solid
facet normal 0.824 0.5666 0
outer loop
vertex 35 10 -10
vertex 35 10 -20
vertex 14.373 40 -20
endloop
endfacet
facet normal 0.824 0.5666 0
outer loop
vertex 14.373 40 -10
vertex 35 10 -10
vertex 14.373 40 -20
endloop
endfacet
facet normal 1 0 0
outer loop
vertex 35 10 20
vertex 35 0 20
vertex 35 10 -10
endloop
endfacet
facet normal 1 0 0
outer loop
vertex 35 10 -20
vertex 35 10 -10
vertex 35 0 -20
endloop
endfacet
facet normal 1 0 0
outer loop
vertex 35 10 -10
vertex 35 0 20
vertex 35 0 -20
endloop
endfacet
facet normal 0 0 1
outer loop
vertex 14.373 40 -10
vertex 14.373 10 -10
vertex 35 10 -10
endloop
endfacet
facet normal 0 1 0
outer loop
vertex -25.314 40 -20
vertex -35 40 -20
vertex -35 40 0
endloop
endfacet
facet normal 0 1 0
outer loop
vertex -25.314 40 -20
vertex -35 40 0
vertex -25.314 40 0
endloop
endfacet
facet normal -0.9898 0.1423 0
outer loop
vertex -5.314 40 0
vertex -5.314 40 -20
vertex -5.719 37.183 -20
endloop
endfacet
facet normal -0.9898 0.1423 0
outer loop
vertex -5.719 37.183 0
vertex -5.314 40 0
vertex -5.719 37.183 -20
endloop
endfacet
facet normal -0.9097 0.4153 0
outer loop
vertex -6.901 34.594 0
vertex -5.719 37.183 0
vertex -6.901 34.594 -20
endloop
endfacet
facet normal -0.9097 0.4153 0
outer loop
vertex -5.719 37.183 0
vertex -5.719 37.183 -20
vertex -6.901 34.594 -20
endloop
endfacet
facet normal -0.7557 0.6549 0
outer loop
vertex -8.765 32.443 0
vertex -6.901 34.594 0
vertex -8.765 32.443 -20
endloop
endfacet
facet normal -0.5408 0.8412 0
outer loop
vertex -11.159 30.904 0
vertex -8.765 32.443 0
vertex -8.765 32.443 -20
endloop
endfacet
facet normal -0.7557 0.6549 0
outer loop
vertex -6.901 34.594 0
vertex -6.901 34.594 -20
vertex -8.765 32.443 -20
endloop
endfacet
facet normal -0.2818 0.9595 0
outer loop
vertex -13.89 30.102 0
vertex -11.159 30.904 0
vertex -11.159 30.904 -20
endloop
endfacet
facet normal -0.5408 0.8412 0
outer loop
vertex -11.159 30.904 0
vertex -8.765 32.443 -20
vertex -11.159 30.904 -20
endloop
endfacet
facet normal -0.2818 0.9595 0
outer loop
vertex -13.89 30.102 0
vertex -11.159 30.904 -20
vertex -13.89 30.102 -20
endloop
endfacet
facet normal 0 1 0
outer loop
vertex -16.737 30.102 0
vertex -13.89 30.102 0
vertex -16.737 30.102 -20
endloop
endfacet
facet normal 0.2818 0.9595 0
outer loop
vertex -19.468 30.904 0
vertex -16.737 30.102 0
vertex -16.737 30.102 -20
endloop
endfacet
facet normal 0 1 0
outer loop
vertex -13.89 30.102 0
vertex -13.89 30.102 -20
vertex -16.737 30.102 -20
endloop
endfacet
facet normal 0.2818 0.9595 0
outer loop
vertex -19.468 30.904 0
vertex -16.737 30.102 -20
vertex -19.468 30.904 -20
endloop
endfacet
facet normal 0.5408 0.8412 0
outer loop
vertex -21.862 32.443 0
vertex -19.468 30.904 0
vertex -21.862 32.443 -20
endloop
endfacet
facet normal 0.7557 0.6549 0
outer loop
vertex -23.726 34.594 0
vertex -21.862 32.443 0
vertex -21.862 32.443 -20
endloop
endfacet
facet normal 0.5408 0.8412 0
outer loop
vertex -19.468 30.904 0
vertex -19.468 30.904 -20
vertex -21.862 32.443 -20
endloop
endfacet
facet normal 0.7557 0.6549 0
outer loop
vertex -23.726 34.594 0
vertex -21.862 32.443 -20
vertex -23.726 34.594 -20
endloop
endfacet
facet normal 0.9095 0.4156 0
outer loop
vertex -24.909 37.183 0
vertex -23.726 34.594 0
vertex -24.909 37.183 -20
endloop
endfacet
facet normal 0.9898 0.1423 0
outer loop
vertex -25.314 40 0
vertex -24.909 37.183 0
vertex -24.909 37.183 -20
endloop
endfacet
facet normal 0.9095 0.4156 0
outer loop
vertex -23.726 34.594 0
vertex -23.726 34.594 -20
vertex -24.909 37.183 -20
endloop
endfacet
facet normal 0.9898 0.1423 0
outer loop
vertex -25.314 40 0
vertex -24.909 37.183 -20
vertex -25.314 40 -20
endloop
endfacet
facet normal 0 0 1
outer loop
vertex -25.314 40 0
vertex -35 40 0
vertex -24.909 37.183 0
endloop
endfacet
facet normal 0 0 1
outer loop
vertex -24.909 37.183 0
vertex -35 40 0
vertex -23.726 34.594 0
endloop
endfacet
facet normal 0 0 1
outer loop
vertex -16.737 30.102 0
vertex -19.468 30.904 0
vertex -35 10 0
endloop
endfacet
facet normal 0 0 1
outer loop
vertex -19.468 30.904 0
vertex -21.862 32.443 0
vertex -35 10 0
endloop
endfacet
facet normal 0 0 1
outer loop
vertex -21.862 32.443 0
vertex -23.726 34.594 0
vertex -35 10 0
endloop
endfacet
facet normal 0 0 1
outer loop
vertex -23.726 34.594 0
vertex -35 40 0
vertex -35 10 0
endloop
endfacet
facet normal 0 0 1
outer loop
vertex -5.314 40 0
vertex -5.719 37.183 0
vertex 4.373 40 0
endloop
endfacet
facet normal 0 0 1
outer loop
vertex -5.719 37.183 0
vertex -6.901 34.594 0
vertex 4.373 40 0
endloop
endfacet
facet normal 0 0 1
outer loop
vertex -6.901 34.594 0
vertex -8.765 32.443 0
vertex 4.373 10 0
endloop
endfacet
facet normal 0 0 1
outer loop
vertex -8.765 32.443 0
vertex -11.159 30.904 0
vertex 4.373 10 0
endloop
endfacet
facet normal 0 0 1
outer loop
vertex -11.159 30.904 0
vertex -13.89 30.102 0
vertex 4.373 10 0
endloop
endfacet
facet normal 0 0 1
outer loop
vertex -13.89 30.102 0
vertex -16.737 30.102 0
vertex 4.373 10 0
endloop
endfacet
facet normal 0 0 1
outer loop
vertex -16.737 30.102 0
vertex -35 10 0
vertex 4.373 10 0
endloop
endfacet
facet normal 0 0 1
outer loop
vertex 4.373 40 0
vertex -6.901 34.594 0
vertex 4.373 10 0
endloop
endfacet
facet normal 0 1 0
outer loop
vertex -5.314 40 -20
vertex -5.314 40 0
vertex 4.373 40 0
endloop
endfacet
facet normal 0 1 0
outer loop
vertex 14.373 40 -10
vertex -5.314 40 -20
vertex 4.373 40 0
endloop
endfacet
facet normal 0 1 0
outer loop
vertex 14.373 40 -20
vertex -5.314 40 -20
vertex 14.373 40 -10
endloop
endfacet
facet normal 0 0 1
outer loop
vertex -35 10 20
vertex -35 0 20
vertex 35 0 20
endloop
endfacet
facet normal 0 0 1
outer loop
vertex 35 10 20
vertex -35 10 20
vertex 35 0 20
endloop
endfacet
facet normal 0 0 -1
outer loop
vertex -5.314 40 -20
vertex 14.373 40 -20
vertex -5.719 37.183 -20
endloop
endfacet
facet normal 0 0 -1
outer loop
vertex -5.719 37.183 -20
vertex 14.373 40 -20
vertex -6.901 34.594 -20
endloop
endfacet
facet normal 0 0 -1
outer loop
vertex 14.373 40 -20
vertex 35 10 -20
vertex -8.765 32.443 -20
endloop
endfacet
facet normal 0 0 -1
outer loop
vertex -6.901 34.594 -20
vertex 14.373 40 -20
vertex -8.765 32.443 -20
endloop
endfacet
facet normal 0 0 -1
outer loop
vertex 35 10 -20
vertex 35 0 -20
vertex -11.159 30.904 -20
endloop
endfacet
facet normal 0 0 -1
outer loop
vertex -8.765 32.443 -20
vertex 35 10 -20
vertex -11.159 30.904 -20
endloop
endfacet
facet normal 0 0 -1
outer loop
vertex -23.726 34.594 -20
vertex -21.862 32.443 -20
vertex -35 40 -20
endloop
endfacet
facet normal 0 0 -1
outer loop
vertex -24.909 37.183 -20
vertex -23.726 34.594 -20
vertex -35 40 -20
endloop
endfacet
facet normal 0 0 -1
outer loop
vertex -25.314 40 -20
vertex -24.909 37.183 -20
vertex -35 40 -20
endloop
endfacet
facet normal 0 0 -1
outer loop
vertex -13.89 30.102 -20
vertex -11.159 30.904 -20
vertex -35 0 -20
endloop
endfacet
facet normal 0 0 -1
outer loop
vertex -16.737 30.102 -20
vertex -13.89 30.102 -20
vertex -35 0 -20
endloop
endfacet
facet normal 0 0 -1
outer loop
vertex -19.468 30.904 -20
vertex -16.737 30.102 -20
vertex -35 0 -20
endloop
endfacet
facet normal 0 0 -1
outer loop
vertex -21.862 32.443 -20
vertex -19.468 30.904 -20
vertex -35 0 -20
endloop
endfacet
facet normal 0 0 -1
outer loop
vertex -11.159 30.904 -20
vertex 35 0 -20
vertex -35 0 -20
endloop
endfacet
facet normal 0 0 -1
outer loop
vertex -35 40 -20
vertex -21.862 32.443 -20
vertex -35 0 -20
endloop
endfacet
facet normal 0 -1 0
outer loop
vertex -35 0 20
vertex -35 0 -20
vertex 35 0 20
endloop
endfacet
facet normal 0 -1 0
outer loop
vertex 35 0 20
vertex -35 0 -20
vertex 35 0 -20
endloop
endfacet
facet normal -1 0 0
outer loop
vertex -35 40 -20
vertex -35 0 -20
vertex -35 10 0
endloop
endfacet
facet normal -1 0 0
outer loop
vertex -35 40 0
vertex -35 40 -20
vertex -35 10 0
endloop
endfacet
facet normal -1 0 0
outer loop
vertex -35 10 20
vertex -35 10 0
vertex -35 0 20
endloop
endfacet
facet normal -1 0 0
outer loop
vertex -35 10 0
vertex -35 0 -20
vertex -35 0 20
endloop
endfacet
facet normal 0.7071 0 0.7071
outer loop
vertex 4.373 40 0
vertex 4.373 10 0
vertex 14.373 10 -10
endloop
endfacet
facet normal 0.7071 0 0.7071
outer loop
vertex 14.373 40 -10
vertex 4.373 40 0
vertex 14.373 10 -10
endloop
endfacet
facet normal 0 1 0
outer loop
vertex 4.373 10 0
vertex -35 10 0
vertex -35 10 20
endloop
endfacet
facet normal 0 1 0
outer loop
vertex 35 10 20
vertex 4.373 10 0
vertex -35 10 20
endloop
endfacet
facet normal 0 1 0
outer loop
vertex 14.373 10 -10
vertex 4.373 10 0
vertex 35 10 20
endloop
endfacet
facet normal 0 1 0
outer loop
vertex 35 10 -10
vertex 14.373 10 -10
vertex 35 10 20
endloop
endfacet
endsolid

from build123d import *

# Parameters (mm, degrees)
SKETCH1_W               = 70
SKETCH1_H               = 40
BOSS_EXTRUDE1_DEPTH     = 10
BOSS_EXTRUDE2_DEPTH     = 30
CUT_EXTRUDE1_DEPTH      = 57.789083458
CUT_EXTRUDE1_DEPTH_BACK = 57.789083458
SKETCH3_OUTSIDE_W       = 90
SKETCH3_OUTSIDE_H       = 60


with BuildPart() as part:
    # Sketch1 → Boss-Extrude1 (new body)
    with BuildSketch(Plane(origin=(0, 0, 0), x_dir=(1, 0, 0), z_dir=(0, 1, 0))):
        Rectangle(SKETCH1_W, SKETCH1_H)
    extrude(amount=BOSS_EXTRUDE1_DEPTH)

    # Sketch2 → Boss-Extrude2 (add)
    with BuildSketch(Plane(origin=(0, 10, 0), x_dir=(1, 0, 0), z_dir=(0, 1, 0))):
        Polygon((-35, 20), (-35, 0), (4.372843299, 0), (14.372843299, 10), (35, 10), (35, 20), align=None)
    extrude(amount=BOSS_EXTRUDE2_DEPTH)

    # Sketch3 outside → Cut-Extrude1 (cut, two sides: drawn at the far end of the back side and taken through both)
    with BuildSketch(Plane.XY.offset(-CUT_EXTRUDE1_DEPTH_BACK)):
        with Locations((0, 20)):
            Rectangle(SKETCH3_OUTSIDE_W, SKETCH3_OUTSIDE_H)
        with BuildLine():
            Line((-25.31357835, 40), (-35, 40))
            Line((-35, 40), (-35, 0))
            Line((-35, 0), (35, 0))
            Line((35, 0), (35, 10))
            Line((35, 10), (14.372843299, 40))
            Line((14.372843299, 40), (-5.31357835, 40))
            ThreePointArc((-5.31357835, 40), (-15.31357835, 30), (-25.31357835, 40))
        make_face(mode=Mode.SUBTRACT)
    extrude(amount=CUT_EXTRUDE1_DEPTH + CUT_EXTRUDE1_DEPTH_BACK, mode=Mode.SUBTRACT)


solid = part.part
